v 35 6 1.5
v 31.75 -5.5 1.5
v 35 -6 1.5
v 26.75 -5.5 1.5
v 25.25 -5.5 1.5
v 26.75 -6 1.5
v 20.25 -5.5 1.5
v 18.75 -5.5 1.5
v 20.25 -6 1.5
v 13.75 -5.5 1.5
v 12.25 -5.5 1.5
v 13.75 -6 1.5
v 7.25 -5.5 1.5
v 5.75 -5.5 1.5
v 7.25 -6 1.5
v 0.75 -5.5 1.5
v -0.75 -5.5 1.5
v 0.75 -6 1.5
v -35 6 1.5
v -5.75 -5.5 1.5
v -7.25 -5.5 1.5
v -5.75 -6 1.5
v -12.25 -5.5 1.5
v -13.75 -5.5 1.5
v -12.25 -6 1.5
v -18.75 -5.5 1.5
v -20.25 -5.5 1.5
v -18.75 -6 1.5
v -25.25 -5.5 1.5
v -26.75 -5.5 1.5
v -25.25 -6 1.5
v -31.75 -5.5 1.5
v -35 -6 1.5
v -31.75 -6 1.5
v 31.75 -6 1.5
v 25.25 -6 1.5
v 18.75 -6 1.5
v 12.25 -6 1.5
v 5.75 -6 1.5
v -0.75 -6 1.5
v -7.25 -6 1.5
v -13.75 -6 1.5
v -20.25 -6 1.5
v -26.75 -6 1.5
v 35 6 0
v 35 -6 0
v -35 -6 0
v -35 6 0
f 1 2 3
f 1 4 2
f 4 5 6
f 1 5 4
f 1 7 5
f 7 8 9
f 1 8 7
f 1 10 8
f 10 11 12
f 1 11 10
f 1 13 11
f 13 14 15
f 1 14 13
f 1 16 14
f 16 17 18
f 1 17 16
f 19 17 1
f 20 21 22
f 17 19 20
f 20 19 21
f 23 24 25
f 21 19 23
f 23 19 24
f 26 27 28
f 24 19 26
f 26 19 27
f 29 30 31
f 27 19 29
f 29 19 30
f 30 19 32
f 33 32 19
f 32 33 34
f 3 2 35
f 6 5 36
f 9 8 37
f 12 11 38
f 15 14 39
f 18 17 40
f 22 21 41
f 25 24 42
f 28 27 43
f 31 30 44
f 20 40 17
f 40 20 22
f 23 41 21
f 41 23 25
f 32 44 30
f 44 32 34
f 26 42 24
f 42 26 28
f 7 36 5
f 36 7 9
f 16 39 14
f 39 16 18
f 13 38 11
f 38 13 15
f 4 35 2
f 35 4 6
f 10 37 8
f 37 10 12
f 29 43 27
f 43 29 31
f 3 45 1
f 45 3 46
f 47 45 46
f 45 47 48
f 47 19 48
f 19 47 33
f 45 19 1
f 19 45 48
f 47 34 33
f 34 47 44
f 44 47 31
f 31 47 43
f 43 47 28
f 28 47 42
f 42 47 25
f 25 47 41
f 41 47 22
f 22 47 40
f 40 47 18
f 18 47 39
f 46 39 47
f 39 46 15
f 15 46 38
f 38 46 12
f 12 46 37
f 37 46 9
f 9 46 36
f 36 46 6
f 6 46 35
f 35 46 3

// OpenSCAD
// 10-well comb for casting agarose gels, printed lying flat
// Units: mm

// ---- Spine (back bar) ----
spine_len   = 70;   // spine length along X
spine_wid   = 12;   // spine width along Y
plate_thk   = 1.5;  // plate thickness along Z

// ---- Teeth ----
tooth_count = 10;   // number of teeth
tooth_w     = 5.0;  // tooth width along X
tooth_l     = 12;   // tooth length along Y (hangs in -Y)
tooth_gap   = 1.5;  // gap between neighbouring teeth along X

// ---- Misc ----
eps         = 0.5;  // cutter overshoot past faces
$fn         = 64;

// Derived: row length of teeth + gaps, centred on spine
row_len = (tooth_count * tooth_w) + ((tooth_count - 1) * tooth_gap);

difference() {
    // Base plate (spine + teeth area)
    translate([-spine_len/2, -spine_wid/2, 0])
        cube([spine_len, spine_wid, plate_thk]);

    // Teeth cut from the top face, extending into -Y past the plate
    for (i = [0 : tooth_count - 1]) {
        x = -row_len/2 + i * (tooth_w + tooth_gap);
        translate([x, -spine_wid/2 - tooth_l, plate_thk])
            cube([tooth_w, tooth_l + eps, plate_thk]);
    }
}
